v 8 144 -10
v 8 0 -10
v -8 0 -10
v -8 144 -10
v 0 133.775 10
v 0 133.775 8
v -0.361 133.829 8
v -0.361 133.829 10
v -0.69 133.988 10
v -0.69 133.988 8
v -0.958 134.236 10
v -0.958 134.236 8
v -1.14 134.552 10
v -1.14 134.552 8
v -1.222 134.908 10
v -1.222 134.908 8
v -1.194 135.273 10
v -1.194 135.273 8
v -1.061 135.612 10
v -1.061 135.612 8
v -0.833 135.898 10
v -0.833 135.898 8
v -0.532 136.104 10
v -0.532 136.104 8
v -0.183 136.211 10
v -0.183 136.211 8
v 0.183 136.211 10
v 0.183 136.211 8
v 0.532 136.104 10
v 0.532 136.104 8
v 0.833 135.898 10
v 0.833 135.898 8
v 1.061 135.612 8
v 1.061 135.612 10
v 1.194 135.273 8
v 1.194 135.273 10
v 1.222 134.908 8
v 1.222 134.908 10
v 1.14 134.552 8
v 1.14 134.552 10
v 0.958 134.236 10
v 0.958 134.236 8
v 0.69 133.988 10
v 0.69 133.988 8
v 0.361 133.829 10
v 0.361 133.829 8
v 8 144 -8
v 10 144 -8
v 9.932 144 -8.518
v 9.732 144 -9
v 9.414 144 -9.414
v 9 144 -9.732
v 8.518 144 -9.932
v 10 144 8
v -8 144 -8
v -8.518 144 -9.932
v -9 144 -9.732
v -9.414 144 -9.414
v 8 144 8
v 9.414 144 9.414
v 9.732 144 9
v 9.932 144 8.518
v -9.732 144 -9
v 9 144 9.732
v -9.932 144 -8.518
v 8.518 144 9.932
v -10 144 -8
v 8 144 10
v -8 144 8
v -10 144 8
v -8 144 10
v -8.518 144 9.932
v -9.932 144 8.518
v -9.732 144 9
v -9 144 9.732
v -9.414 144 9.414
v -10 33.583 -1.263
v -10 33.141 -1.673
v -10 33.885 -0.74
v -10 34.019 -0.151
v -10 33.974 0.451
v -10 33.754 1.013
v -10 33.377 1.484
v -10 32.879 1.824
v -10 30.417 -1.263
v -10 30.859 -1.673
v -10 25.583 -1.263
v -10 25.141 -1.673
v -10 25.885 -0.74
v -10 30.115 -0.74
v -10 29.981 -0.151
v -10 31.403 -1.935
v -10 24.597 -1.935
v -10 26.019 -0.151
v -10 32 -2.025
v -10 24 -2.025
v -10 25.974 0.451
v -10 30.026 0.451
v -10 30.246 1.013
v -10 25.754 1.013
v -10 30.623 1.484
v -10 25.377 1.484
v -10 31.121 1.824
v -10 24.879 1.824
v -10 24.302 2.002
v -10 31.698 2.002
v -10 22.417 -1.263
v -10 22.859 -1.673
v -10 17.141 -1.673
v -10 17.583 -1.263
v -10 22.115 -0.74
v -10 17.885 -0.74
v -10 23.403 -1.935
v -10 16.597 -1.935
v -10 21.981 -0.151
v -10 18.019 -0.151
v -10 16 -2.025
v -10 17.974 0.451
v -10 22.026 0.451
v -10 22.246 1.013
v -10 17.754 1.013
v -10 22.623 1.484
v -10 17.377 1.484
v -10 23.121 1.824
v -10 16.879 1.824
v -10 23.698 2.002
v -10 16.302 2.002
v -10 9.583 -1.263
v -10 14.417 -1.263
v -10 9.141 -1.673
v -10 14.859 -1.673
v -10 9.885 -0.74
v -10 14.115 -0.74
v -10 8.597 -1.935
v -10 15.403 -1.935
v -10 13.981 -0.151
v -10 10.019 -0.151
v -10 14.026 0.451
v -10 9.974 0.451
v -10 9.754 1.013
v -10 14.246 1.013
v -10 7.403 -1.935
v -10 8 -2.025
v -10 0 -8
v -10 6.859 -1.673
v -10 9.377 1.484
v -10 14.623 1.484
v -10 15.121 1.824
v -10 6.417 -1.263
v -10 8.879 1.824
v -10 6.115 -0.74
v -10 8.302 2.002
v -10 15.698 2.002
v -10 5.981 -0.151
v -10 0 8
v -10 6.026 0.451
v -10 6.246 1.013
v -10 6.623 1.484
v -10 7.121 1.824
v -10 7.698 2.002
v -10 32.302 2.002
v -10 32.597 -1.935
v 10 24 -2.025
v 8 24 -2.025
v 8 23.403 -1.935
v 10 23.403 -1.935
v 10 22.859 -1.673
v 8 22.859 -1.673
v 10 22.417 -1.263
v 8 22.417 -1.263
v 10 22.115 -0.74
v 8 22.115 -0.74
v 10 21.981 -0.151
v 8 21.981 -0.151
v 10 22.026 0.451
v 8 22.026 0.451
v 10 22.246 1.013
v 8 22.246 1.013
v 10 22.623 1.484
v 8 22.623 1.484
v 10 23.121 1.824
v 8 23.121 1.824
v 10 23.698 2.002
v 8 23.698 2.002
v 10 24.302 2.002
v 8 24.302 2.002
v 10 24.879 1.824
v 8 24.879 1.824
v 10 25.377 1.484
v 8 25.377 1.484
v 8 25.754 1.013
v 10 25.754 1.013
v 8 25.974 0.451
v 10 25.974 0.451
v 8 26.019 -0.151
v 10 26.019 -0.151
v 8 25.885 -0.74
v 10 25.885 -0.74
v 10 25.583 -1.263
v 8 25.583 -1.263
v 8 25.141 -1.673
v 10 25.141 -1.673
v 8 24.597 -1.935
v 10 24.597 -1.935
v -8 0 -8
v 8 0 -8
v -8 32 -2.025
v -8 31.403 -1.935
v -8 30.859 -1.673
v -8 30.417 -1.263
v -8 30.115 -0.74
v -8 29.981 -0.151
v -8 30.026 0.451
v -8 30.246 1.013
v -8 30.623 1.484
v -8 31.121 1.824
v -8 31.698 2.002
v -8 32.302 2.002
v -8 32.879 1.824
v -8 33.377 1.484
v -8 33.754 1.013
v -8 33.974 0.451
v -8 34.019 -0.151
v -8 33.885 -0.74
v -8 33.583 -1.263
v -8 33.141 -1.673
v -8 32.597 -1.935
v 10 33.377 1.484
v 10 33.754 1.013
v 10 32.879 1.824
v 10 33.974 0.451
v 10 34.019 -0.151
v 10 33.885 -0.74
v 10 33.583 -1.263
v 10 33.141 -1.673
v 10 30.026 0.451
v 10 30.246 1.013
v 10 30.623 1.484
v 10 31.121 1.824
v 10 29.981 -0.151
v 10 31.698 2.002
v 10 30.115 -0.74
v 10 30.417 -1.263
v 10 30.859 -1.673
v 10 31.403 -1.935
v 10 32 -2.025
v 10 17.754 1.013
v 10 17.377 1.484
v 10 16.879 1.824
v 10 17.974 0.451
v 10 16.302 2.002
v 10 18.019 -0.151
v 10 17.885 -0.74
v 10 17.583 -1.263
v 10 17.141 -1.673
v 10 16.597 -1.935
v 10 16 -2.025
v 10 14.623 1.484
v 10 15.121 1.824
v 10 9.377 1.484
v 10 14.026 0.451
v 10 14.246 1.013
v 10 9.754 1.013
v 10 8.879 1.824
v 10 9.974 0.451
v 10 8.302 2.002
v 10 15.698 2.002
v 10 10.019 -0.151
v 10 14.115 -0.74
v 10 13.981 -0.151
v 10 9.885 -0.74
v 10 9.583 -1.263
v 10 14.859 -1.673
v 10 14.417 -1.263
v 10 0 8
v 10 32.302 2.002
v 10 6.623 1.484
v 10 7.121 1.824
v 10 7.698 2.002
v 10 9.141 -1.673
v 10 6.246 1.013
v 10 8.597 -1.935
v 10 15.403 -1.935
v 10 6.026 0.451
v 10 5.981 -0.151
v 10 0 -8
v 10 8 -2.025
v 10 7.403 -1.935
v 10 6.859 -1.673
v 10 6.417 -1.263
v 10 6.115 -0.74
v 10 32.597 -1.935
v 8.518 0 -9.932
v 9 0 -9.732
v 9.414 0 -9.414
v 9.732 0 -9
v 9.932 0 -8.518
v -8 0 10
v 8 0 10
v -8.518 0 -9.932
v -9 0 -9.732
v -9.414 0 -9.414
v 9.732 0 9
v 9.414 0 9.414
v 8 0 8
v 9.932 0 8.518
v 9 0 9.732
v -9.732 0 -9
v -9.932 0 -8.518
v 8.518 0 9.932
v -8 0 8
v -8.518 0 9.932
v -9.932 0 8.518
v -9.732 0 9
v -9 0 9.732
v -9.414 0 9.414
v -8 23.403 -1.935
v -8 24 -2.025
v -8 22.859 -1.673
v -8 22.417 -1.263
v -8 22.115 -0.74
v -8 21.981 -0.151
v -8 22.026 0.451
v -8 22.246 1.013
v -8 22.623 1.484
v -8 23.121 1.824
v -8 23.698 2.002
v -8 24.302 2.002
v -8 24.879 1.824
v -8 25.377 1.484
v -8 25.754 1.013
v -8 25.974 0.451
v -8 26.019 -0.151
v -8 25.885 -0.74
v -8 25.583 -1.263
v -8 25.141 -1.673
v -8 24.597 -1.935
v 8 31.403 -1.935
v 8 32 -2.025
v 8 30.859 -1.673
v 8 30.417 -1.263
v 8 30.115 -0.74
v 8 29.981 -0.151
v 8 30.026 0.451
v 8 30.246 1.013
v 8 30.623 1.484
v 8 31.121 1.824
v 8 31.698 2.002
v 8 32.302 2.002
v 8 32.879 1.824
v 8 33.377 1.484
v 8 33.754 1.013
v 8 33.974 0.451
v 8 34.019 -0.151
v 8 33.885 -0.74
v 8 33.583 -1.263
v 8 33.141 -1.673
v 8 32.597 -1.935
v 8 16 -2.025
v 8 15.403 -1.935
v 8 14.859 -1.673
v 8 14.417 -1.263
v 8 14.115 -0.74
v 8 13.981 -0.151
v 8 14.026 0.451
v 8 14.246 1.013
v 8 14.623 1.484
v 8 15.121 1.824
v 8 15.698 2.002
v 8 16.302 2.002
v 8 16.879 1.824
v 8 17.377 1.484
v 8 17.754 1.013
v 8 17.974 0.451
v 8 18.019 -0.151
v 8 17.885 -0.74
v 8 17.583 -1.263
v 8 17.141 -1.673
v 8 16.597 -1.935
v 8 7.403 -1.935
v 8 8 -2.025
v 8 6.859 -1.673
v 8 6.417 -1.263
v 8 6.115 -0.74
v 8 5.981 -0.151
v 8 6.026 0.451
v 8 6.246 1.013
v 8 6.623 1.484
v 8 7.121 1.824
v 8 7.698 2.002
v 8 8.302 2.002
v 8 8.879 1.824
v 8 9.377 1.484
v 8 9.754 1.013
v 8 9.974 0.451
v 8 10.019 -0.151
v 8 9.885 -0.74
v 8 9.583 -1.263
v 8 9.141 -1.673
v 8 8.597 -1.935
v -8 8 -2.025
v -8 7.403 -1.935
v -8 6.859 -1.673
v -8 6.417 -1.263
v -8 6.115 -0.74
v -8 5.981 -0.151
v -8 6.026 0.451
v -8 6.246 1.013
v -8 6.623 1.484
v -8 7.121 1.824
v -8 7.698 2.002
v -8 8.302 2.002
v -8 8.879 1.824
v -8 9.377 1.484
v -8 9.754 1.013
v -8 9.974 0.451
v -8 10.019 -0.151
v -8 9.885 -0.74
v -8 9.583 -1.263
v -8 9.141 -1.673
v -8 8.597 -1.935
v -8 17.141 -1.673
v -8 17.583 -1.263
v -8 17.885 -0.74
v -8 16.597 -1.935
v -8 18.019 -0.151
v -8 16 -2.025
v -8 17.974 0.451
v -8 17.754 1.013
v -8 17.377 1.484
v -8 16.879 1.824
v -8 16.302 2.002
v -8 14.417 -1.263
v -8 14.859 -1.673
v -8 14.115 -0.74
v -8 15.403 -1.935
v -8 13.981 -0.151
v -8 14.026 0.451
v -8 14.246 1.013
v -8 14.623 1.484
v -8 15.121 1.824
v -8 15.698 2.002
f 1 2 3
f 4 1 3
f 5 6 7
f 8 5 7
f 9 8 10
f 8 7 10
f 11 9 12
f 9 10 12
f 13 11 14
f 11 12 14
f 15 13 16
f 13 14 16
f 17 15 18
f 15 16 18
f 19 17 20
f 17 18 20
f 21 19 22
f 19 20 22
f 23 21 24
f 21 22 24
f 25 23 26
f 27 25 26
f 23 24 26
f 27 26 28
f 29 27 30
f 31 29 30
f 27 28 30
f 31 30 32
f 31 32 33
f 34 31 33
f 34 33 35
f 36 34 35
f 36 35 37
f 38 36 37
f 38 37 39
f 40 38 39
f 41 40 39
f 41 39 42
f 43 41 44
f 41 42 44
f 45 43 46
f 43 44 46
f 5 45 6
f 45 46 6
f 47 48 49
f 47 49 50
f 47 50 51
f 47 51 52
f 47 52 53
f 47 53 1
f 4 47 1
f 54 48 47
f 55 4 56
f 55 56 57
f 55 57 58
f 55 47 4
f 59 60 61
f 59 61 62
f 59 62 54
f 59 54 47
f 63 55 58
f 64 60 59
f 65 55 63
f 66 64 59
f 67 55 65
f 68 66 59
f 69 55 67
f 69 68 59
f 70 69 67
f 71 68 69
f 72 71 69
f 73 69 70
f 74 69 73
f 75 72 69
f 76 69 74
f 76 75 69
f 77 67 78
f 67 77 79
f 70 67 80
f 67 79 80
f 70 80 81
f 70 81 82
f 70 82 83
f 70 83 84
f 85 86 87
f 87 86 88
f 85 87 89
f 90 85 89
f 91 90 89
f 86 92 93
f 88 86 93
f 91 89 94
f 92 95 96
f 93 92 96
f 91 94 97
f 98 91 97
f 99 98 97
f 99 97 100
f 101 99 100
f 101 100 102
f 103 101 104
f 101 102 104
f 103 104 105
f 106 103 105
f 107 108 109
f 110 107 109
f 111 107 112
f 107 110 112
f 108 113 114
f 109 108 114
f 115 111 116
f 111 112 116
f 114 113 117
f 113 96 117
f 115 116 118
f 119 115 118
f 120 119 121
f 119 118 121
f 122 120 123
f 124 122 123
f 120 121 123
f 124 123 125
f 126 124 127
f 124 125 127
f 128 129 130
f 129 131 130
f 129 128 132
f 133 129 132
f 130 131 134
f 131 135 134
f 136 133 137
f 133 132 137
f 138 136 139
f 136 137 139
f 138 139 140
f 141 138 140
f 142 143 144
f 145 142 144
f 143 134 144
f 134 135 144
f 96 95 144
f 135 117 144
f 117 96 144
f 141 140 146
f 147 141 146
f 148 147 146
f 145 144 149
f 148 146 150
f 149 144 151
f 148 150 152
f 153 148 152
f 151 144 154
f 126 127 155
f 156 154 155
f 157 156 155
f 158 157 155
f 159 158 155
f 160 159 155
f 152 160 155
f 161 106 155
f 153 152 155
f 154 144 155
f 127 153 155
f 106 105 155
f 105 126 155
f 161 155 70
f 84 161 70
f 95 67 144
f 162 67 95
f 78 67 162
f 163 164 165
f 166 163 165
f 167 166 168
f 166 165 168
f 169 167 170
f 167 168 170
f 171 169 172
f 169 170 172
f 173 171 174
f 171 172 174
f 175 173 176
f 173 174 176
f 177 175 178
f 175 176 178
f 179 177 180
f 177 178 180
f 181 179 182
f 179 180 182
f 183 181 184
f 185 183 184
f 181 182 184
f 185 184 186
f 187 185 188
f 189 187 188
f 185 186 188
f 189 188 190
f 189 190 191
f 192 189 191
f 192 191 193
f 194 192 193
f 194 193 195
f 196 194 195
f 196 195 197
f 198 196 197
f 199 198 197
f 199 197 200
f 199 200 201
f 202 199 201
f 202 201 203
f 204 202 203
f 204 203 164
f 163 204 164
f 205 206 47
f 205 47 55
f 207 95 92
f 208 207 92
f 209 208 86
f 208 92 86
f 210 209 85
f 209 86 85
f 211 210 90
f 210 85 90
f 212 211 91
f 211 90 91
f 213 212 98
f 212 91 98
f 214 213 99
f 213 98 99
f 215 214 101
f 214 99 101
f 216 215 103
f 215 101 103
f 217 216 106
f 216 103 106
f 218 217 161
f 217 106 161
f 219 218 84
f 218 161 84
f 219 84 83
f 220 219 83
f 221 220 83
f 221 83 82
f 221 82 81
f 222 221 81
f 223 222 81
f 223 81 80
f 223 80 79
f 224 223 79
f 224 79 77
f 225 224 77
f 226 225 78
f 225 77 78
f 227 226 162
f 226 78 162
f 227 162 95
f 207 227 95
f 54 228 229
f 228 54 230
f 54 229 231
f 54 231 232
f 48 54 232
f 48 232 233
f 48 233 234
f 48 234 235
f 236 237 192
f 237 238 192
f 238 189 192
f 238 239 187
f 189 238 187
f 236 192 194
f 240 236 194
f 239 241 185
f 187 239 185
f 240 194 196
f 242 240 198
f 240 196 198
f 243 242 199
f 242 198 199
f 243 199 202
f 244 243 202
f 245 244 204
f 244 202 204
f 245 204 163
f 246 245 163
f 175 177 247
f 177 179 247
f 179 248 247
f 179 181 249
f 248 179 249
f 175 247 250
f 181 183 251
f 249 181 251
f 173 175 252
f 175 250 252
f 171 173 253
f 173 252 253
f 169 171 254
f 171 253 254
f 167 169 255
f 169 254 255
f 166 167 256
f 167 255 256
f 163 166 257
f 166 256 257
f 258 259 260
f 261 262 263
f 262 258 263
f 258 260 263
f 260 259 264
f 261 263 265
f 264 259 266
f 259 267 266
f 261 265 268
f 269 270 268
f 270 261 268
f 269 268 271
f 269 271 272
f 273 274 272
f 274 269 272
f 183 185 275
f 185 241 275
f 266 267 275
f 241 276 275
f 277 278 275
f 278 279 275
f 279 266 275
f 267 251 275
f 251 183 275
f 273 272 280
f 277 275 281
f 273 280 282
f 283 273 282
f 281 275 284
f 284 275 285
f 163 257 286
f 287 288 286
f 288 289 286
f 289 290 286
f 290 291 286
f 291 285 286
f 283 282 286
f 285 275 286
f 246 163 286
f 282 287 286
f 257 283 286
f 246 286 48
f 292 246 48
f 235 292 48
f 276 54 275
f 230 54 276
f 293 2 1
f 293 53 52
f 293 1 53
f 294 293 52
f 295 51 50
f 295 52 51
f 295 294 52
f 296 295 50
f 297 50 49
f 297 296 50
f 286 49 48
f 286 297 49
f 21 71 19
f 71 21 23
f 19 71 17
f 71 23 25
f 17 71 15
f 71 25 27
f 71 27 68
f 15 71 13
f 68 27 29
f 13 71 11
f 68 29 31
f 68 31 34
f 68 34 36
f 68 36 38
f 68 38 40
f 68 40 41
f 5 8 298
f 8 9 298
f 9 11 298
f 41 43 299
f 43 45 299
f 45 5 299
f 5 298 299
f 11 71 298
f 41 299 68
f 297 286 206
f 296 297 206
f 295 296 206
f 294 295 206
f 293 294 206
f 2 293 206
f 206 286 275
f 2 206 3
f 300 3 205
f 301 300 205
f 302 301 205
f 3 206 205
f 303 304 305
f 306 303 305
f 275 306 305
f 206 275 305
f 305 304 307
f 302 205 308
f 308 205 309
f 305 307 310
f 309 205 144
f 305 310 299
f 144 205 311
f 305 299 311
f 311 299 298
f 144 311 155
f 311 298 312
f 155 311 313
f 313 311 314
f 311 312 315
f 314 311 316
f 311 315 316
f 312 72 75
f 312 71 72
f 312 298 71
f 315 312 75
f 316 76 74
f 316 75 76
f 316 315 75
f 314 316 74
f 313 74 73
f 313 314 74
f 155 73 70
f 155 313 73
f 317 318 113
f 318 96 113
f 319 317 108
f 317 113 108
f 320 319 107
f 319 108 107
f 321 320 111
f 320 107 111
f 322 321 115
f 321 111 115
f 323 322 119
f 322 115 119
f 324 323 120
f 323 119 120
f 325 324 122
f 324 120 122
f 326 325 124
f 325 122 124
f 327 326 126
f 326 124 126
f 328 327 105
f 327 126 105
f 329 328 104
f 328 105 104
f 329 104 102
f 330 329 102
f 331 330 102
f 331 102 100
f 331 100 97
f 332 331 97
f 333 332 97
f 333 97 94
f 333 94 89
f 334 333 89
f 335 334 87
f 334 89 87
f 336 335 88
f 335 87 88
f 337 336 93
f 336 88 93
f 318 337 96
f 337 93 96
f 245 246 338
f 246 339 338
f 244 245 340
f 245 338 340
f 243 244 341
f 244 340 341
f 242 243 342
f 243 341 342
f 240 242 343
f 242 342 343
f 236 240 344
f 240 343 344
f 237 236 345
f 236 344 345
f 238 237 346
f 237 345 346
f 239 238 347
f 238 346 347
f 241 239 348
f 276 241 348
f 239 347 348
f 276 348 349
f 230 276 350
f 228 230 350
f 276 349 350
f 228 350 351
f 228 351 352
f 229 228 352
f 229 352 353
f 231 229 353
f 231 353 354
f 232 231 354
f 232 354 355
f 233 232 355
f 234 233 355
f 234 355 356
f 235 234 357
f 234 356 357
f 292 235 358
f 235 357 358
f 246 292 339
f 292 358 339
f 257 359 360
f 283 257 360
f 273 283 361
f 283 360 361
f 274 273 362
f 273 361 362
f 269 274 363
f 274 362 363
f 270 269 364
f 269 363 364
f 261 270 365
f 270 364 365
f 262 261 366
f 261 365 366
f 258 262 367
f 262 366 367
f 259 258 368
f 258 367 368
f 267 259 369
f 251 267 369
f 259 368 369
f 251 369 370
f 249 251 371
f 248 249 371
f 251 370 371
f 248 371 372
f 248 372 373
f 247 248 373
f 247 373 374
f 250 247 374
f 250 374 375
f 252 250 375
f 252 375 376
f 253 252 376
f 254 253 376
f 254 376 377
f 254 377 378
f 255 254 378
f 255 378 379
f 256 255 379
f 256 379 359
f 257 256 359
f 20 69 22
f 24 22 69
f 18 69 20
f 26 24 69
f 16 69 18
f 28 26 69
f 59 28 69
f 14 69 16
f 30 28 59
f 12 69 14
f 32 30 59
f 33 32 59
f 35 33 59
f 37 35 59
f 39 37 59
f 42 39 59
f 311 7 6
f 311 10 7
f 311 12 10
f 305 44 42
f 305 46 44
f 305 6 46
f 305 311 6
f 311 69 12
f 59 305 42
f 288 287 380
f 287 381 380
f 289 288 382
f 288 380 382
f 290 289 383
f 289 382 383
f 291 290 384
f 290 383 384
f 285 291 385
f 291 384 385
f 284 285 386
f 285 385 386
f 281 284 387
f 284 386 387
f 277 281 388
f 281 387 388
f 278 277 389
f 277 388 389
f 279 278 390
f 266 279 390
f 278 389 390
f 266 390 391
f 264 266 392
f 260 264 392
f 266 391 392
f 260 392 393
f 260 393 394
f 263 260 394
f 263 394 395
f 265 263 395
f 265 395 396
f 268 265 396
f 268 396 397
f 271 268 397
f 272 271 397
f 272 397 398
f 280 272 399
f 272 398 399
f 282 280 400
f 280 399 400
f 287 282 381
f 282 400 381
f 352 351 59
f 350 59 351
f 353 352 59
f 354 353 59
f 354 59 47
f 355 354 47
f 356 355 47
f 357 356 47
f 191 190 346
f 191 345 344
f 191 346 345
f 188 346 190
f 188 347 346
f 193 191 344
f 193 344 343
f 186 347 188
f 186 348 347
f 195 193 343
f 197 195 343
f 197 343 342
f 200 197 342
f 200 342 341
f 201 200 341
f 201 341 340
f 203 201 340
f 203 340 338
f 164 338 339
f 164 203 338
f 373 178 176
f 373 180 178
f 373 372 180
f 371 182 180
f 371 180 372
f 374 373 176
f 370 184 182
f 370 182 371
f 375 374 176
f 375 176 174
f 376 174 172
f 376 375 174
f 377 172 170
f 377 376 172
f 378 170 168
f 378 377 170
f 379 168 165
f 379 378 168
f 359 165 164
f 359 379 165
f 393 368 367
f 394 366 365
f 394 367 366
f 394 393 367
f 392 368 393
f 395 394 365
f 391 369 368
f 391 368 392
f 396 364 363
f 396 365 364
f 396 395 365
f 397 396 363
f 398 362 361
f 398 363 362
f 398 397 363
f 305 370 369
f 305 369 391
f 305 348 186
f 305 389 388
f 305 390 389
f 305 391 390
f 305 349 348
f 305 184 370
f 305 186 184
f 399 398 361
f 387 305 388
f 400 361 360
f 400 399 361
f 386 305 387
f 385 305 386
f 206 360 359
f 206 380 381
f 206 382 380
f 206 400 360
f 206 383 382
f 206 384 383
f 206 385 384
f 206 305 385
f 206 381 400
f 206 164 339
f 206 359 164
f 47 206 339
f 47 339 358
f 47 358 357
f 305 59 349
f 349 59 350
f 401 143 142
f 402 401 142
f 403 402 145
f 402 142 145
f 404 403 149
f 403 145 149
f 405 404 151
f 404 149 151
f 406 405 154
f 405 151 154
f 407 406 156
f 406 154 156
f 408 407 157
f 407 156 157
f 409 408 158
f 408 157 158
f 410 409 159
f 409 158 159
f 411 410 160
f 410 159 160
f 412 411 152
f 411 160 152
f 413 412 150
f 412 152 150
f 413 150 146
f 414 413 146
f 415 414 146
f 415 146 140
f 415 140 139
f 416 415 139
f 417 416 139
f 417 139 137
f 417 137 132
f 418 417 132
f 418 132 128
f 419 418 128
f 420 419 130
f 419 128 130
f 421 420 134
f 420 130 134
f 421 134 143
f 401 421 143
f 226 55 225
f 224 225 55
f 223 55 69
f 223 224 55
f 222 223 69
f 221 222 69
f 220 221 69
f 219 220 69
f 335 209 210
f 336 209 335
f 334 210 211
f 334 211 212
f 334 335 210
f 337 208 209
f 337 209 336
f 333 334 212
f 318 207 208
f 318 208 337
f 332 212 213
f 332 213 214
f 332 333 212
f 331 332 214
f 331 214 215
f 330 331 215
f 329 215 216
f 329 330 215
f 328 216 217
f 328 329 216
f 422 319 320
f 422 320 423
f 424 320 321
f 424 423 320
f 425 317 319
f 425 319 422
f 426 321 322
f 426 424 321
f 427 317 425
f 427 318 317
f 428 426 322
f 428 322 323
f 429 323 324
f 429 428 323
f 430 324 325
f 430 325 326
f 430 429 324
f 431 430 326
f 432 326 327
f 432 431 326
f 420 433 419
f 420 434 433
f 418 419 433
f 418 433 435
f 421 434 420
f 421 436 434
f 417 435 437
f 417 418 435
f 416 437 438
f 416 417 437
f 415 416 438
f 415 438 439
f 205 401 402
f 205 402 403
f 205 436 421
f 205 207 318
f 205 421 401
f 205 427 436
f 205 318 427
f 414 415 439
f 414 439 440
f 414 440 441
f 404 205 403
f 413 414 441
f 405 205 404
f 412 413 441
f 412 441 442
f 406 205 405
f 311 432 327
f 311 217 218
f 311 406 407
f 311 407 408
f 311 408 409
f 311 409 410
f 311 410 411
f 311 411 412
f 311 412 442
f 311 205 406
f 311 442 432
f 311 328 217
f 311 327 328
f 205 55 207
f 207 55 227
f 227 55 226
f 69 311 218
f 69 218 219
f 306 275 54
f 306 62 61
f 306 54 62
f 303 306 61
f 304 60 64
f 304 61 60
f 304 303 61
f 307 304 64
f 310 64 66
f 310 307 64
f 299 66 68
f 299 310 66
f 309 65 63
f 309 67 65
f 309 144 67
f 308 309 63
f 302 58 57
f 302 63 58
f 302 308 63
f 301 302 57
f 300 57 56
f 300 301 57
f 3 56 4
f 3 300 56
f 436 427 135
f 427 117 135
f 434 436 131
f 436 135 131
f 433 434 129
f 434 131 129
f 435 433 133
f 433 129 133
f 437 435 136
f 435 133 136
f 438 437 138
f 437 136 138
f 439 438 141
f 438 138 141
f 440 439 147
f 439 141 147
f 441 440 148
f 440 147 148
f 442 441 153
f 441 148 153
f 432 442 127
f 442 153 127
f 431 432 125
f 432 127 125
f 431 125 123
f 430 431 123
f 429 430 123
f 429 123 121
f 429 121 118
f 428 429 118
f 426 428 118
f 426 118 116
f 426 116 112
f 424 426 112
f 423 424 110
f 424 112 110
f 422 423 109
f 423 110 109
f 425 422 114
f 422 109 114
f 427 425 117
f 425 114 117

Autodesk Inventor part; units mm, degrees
ref_plane "YZ Plane" through (0, 0, 0) normal (1, 0, 0) x (0, 1, 0)
ref_plane "XZ Plane" through (0, 0, 0) normal (0, 1, 0) x (-1, 0, 0)
ref_plane "XY Plane" through (0, 0, 0) normal (0, 0, 1) x (1, 0, 0)
sketch "Sketch1" plane through (0, 0, 0) normal (0, 1, 0) x (-1, 0, 0)
  line L0 (8, 10) -> (-8, 10)
  line L1 (-10, 8) -> (-10, -8)
  line L2 (-8, -10) -> (8, -10)
  line L3 (10, -8) -> (10, 8)
  line L4 (10, 10) -> (-10, -10) construction
  line L5 (-10, 10) -> (10, -10) construction
  line L6 (8, 8) -> (-8, 8)
  line L7 (-8, 8) -> (-8, -8)
  line L8 (-8, -8) -> (8, -8)
  line L9 (8, -8) -> (8, 8)
  arc A0 (10, 8) -> (8, 10) centre (8, 8) ccw
  arc A1 (8, -10) -> (10, -8) centre (8, -8) ccw
  arc A2 (-10, -8) -> (-8, -10) centre (-8, -8) ccw
  arc A3 (-8, 10) -> (-10, 8) centre (-8, 8) ccw
  point P0 (0, 0)
  dimension "d0" = 20
  dimension "d1" = 20
  dimension "d2" = 2
  dimension "d3" = 2
  dimension "d4" = 2
extrude "Extrusion1" add sketch "Sketch1" along normal blind 144
sketch "Sketch2" plane through (10, 0, 8) normal (1, 0, 0) x (0, 0, -1)
  line L0 (0, 0) -> (16, 0) projected
  line L1 (16, 0) -> (16, 144) projected
  point P0 (8, 0)
  point P1 (8, 8)
  point P2 (8, 0)
  point P3 (8, 16)
  point P4 (8, 24)
  point P5 (8, 32)
  dimension "d7" = 8
  dimension "d10" = 8
hole "Hole1" at (10, 8, 0) at (10, 16, 0) at (10, 24, 0) at (10, 32, 0) direction (-1, 0, 0) diameter 4.05 end through all
sketch "Sketch3" plane through (-8, 0, 10) normal (0, 0, 1) x (1, 0, 0)
  line L0 (0, 144) -> (16, 144) projected
  line L1 (0, 0) -> (0, 144) projected
  point P0 (8, 0)
  point P1 (8, 135)
  point P2 (8, 144)
  dimension "d22" = 9
  dimension "d23" = 8
hole "Hole2" at (0, 135, 10) direction (0, 0, -1) diameter 2.45 depth 2
properties part number "suspension2chassisarm"
